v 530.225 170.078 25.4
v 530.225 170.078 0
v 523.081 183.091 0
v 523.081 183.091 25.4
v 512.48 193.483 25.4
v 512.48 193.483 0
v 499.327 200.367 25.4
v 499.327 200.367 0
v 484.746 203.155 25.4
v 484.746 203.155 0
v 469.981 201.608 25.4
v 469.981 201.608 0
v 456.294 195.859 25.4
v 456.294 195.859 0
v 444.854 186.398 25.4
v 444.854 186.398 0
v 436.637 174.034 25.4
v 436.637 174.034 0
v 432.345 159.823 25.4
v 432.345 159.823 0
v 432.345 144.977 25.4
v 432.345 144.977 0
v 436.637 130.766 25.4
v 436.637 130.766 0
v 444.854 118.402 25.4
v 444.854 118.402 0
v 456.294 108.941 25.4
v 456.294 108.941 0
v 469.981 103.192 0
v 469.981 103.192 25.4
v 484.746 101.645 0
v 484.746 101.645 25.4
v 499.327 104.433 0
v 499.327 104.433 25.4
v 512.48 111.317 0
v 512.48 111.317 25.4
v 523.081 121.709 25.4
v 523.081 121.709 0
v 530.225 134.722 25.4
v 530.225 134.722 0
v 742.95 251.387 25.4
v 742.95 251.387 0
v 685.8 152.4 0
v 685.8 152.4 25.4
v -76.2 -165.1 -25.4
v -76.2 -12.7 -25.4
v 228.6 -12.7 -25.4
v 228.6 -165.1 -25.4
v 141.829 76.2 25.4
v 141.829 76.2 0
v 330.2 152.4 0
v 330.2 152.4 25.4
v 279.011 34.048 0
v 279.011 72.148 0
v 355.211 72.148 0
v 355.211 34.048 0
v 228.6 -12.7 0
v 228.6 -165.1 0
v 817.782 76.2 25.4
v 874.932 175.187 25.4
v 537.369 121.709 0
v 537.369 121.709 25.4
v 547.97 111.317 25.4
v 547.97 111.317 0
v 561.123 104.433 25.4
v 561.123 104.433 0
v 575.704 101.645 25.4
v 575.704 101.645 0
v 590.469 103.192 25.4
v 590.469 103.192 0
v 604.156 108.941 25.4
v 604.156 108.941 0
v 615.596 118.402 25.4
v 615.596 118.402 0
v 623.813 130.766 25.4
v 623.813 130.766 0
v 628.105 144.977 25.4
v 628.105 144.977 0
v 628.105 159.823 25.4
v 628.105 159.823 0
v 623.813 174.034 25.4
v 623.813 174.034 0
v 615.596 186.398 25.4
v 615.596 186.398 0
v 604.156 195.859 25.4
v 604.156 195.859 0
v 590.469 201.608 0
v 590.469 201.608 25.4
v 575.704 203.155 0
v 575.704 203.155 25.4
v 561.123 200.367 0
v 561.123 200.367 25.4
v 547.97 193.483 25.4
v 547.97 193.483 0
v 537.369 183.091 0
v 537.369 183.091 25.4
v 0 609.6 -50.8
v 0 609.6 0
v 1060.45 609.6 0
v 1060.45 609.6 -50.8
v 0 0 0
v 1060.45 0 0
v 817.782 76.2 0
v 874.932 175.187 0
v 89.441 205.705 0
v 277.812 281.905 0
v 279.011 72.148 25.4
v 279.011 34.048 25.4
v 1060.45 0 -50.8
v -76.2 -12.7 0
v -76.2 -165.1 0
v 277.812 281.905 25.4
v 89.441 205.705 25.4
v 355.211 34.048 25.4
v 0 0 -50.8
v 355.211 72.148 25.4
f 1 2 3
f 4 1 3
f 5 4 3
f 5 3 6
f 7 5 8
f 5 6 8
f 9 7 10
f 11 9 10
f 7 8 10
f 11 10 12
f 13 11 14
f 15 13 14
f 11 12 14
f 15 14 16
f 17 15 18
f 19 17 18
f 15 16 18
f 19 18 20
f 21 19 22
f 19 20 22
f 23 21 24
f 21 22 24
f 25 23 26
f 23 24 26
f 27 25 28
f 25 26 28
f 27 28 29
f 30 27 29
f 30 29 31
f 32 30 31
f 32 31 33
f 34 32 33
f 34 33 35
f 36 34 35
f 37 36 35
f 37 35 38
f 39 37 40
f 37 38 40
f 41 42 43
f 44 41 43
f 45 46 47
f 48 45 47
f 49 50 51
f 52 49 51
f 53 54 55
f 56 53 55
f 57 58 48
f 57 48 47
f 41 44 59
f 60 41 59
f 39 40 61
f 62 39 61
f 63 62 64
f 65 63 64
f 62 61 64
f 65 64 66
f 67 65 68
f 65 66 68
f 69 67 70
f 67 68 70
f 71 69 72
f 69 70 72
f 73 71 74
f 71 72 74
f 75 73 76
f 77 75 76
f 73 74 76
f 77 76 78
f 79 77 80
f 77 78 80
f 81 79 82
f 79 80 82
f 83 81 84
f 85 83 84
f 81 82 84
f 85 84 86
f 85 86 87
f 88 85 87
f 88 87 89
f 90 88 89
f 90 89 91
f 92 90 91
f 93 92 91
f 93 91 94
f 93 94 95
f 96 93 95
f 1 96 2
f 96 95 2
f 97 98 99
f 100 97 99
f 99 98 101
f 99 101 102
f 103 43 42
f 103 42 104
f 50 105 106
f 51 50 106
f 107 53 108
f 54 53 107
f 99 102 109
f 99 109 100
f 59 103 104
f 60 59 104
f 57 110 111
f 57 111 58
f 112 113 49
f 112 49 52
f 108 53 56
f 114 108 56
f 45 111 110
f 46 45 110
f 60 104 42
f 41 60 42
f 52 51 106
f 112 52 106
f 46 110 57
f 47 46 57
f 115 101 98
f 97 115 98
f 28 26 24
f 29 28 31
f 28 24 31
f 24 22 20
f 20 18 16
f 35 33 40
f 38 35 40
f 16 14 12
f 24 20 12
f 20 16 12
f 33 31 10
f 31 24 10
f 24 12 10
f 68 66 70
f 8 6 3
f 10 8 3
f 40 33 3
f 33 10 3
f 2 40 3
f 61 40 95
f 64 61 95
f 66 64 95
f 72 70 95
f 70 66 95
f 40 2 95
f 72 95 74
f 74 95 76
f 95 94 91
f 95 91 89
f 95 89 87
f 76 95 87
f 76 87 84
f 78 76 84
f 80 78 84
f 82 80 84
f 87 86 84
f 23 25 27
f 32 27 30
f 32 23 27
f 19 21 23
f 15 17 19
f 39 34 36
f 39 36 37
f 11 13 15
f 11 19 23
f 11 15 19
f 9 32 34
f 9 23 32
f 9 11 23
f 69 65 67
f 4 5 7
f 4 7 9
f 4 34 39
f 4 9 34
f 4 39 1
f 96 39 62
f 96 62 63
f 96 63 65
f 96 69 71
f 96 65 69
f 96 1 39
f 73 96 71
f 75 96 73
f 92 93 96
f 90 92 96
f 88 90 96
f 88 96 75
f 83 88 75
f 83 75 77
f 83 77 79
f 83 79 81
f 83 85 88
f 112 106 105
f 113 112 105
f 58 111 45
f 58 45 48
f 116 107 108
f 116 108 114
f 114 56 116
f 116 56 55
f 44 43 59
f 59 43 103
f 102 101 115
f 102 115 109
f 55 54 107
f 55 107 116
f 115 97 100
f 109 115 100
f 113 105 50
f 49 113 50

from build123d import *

# Parameters (mm, degrees)
F1_W     = 76.2
F1_H     = 38.1
F2_DEPTH = 25.4
F0_W     = 1060.45
F0_H     = 609.6
F3_DEPTH = 50.8
F1_W_2   = 304.8
F1_H_2   = 152.4
F4_DEPTH = 25.4


with BuildPart() as f2:
    # F1 (on face) → F2 (new body)
    with BuildSketch(Plane.XY):
        with BuildLine():
            ThreePointArc((530.225, 170.077652), (431.8, 152.4), (530.225, 134.722348))
            ThreePointArc((530.225, 134.722348), (628.65, 152.4), (530.225, 170.077652))
        make_face()
        Polygon((330.2, 152.4), (277.8125, 281.905366), (89.441058, 205.705366), (141.828558, 76.2), align=None)
        with Locations((317.111106, 53.097629)):
            Rectangle(F1_W, F1_H)
        Polygon((817.782272, 76.2), (874.932272, 175.186704), (742.95, 251.386704), (685.8, 152.4), align=None)
    extrude(amount=F2_DEPTH)


with BuildPart() as f3:
    # F0 (on Top) → F3 (new body)
    with BuildSketch(Plane.XY):
        with Locations((530.225, 304.8)):
            Rectangle(F0_W, F0_H)
    extrude(amount=-F3_DEPTH)


with BuildPart() as f4:
    # F1 (on face) → F4 (new body)
    with BuildSketch(Plane.XY):
        with Locations((76.2, -88.9)):
            Rectangle(F1_W_2, F1_H_2)
    extrude(amount=-F4_DEPTH)


solid = Compound([f2.part, f3.part, f4.part])
